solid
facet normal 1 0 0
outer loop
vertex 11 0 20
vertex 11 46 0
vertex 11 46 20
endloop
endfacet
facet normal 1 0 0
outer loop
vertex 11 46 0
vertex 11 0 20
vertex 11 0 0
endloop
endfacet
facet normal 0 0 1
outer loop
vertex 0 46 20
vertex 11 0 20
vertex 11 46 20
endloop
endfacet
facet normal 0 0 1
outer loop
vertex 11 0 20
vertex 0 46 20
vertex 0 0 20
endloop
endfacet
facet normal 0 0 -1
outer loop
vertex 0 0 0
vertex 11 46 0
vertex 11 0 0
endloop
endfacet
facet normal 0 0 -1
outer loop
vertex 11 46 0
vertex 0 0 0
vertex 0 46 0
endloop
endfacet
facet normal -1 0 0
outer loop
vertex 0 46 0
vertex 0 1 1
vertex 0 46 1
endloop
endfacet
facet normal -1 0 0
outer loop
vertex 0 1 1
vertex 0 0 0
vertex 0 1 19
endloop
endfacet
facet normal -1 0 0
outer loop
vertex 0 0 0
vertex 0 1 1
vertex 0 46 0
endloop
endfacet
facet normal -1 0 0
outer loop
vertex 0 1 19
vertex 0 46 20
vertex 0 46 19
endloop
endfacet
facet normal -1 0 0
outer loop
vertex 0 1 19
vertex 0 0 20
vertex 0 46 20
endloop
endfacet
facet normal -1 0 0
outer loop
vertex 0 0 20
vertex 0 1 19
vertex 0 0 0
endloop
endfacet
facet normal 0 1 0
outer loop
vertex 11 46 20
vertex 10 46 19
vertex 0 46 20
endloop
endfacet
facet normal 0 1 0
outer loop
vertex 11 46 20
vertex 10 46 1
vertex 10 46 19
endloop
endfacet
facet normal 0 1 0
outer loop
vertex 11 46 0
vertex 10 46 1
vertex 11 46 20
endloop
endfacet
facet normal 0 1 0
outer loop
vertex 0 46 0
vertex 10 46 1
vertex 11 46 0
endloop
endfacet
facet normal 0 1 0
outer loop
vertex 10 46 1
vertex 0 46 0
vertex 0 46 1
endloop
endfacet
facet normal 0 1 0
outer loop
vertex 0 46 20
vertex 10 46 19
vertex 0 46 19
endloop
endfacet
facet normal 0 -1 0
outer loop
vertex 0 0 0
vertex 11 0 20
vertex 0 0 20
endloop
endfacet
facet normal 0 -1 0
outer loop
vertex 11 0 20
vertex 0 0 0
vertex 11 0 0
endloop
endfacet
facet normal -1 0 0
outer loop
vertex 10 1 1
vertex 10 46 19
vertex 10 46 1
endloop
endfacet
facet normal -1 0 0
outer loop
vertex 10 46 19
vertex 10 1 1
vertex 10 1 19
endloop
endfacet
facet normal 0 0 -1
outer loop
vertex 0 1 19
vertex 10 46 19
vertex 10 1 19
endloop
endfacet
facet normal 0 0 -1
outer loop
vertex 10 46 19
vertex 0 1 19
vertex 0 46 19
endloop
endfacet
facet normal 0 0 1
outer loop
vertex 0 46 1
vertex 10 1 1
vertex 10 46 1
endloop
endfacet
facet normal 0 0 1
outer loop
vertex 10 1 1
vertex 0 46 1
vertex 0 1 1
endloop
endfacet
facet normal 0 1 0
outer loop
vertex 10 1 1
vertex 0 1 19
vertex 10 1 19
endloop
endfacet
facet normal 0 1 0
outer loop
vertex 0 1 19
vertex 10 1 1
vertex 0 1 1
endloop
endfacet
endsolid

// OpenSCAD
module holder_for_extension() {
    difference() {
        cube([1.1, 4.5+0.1, 1.8+0.2]);
        translate([-0.1, 0.1, 0.1]) cube([1.1, 4.5+0.1, 1.8]);
    }
}

$fn=300;
scale([10, 10, 10]) holder_for_extension();
